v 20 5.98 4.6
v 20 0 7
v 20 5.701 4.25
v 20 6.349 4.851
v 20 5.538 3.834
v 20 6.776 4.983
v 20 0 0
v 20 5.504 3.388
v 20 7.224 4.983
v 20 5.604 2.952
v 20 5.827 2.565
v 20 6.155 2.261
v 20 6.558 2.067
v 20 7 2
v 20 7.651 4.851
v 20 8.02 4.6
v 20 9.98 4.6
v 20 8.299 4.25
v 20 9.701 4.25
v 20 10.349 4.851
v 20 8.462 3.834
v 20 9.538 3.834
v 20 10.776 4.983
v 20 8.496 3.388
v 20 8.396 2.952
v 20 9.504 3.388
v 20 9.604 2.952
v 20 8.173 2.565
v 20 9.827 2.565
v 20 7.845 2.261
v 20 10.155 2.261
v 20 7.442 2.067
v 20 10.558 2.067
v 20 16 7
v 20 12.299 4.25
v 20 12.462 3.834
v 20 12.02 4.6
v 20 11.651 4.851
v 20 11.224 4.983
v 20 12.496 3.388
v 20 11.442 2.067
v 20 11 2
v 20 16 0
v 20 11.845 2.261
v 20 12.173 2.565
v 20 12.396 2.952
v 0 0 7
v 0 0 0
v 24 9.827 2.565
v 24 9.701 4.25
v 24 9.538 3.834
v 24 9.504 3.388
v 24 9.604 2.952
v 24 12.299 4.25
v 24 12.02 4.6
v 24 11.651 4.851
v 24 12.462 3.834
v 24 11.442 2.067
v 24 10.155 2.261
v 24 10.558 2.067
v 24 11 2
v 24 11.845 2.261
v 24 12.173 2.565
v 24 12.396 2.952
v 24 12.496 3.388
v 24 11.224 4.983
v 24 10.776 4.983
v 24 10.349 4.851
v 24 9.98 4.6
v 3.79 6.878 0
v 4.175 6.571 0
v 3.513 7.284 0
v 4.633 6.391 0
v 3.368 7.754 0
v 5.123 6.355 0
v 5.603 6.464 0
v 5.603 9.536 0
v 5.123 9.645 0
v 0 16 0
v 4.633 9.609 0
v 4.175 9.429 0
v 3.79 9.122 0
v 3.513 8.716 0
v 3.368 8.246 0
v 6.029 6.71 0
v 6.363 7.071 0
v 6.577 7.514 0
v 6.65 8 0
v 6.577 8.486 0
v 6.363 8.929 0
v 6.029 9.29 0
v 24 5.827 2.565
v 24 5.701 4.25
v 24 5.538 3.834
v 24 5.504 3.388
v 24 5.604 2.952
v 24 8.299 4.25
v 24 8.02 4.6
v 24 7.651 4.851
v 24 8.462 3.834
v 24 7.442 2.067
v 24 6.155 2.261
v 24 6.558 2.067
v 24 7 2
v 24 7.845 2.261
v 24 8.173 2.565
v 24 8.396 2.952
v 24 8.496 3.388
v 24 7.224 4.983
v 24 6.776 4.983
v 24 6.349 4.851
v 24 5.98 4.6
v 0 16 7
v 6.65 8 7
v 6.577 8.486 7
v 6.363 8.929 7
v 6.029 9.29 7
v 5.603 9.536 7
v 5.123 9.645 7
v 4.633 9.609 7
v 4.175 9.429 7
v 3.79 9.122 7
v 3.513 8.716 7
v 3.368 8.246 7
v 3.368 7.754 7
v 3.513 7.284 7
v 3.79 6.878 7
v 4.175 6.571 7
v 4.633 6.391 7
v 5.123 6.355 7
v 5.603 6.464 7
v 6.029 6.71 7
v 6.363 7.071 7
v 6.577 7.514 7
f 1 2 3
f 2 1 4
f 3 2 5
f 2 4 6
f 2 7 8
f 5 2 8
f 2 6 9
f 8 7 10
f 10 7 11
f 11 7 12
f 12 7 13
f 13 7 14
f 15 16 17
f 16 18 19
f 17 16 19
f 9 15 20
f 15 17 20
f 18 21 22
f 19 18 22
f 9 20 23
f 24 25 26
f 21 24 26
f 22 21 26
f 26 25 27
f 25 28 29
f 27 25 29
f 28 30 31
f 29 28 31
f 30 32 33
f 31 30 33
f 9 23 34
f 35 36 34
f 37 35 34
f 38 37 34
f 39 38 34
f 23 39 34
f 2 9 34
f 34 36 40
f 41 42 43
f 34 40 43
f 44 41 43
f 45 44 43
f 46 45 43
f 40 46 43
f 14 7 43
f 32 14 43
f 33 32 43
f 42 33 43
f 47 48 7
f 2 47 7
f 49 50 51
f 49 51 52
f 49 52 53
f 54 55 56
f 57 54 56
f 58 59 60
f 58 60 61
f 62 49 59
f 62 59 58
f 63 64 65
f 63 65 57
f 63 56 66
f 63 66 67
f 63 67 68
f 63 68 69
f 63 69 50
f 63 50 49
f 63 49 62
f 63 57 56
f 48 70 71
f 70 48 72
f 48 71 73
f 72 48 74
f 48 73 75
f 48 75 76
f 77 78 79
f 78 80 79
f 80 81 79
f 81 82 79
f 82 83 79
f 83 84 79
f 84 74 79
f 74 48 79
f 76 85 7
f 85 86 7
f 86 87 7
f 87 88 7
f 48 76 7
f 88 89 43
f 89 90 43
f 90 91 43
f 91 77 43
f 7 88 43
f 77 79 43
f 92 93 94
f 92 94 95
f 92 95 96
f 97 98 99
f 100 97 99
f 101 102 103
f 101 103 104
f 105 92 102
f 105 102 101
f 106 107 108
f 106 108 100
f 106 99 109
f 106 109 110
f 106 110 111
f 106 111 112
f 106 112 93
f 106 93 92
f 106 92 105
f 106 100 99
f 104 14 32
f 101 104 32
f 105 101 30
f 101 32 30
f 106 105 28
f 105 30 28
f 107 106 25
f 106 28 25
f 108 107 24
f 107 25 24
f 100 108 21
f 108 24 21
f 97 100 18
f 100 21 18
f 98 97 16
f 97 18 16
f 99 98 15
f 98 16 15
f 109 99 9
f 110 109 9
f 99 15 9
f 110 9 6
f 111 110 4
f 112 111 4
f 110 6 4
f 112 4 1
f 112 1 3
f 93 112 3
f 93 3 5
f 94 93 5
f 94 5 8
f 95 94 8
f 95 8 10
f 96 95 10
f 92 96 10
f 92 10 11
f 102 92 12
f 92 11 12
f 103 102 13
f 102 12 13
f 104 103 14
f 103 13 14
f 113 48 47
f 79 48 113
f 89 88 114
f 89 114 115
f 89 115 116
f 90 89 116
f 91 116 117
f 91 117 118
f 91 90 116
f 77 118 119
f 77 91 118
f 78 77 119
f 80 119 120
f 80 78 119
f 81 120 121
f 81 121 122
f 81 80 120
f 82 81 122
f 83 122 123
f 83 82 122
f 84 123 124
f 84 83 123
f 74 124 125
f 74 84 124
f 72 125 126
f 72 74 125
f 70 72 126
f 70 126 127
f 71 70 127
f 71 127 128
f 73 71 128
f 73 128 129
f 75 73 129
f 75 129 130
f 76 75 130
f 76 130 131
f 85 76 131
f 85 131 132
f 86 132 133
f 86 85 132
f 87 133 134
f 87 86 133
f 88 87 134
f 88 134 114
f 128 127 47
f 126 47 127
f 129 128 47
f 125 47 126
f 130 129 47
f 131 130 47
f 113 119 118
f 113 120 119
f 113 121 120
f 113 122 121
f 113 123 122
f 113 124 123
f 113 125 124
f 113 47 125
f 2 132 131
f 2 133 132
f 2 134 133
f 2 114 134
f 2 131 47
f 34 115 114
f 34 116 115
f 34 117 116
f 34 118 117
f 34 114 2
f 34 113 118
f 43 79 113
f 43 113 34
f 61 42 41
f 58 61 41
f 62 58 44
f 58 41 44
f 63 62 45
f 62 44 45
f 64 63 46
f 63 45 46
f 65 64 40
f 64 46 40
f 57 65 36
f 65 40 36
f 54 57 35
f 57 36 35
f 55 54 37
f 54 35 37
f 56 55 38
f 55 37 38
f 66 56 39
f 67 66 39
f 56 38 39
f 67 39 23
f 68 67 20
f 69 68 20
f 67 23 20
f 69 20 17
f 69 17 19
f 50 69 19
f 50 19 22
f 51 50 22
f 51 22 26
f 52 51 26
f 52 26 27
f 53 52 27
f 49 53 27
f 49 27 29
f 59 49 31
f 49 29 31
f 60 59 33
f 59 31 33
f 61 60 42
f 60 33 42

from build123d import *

# Parameters (mm, degrees)
SKETCH1_W           = 20
SKETCH1_H           = 16
SKETCH1_R           = 1.65
BOSS_EXTRUDE1_DEPTH = 7
SKETCH2_R           = 1.5
BOSS_EXTRUDE2_DEPTH = 4


with BuildPart() as part:
    # Sketch1 → Boss-Extrude1 (new body)
    with BuildSketch(Plane.XY):
        with Locations((10, 8)):
            Rectangle(SKETCH1_W, SKETCH1_H)
        with Locations((5, 8)):
            Circle(SKETCH1_R, mode=Mode.SUBTRACT)
    extrude(amount=BOSS_EXTRUDE1_DEPTH)

    # Sketch2 → Boss-Extrude2 (add)
    with BuildSketch(Plane(origin=(20, 0, 0), x_dir=(0, 0, -1), z_dir=(1, 0, 0))):
        with Locations((-3.5, 7)):
            Circle(SKETCH2_R)
        with Locations((-3.5, 11)):
            Circle(SKETCH2_R)
    extrude(amount=BOSS_EXTRUDE2_DEPTH)


solid = part.part
